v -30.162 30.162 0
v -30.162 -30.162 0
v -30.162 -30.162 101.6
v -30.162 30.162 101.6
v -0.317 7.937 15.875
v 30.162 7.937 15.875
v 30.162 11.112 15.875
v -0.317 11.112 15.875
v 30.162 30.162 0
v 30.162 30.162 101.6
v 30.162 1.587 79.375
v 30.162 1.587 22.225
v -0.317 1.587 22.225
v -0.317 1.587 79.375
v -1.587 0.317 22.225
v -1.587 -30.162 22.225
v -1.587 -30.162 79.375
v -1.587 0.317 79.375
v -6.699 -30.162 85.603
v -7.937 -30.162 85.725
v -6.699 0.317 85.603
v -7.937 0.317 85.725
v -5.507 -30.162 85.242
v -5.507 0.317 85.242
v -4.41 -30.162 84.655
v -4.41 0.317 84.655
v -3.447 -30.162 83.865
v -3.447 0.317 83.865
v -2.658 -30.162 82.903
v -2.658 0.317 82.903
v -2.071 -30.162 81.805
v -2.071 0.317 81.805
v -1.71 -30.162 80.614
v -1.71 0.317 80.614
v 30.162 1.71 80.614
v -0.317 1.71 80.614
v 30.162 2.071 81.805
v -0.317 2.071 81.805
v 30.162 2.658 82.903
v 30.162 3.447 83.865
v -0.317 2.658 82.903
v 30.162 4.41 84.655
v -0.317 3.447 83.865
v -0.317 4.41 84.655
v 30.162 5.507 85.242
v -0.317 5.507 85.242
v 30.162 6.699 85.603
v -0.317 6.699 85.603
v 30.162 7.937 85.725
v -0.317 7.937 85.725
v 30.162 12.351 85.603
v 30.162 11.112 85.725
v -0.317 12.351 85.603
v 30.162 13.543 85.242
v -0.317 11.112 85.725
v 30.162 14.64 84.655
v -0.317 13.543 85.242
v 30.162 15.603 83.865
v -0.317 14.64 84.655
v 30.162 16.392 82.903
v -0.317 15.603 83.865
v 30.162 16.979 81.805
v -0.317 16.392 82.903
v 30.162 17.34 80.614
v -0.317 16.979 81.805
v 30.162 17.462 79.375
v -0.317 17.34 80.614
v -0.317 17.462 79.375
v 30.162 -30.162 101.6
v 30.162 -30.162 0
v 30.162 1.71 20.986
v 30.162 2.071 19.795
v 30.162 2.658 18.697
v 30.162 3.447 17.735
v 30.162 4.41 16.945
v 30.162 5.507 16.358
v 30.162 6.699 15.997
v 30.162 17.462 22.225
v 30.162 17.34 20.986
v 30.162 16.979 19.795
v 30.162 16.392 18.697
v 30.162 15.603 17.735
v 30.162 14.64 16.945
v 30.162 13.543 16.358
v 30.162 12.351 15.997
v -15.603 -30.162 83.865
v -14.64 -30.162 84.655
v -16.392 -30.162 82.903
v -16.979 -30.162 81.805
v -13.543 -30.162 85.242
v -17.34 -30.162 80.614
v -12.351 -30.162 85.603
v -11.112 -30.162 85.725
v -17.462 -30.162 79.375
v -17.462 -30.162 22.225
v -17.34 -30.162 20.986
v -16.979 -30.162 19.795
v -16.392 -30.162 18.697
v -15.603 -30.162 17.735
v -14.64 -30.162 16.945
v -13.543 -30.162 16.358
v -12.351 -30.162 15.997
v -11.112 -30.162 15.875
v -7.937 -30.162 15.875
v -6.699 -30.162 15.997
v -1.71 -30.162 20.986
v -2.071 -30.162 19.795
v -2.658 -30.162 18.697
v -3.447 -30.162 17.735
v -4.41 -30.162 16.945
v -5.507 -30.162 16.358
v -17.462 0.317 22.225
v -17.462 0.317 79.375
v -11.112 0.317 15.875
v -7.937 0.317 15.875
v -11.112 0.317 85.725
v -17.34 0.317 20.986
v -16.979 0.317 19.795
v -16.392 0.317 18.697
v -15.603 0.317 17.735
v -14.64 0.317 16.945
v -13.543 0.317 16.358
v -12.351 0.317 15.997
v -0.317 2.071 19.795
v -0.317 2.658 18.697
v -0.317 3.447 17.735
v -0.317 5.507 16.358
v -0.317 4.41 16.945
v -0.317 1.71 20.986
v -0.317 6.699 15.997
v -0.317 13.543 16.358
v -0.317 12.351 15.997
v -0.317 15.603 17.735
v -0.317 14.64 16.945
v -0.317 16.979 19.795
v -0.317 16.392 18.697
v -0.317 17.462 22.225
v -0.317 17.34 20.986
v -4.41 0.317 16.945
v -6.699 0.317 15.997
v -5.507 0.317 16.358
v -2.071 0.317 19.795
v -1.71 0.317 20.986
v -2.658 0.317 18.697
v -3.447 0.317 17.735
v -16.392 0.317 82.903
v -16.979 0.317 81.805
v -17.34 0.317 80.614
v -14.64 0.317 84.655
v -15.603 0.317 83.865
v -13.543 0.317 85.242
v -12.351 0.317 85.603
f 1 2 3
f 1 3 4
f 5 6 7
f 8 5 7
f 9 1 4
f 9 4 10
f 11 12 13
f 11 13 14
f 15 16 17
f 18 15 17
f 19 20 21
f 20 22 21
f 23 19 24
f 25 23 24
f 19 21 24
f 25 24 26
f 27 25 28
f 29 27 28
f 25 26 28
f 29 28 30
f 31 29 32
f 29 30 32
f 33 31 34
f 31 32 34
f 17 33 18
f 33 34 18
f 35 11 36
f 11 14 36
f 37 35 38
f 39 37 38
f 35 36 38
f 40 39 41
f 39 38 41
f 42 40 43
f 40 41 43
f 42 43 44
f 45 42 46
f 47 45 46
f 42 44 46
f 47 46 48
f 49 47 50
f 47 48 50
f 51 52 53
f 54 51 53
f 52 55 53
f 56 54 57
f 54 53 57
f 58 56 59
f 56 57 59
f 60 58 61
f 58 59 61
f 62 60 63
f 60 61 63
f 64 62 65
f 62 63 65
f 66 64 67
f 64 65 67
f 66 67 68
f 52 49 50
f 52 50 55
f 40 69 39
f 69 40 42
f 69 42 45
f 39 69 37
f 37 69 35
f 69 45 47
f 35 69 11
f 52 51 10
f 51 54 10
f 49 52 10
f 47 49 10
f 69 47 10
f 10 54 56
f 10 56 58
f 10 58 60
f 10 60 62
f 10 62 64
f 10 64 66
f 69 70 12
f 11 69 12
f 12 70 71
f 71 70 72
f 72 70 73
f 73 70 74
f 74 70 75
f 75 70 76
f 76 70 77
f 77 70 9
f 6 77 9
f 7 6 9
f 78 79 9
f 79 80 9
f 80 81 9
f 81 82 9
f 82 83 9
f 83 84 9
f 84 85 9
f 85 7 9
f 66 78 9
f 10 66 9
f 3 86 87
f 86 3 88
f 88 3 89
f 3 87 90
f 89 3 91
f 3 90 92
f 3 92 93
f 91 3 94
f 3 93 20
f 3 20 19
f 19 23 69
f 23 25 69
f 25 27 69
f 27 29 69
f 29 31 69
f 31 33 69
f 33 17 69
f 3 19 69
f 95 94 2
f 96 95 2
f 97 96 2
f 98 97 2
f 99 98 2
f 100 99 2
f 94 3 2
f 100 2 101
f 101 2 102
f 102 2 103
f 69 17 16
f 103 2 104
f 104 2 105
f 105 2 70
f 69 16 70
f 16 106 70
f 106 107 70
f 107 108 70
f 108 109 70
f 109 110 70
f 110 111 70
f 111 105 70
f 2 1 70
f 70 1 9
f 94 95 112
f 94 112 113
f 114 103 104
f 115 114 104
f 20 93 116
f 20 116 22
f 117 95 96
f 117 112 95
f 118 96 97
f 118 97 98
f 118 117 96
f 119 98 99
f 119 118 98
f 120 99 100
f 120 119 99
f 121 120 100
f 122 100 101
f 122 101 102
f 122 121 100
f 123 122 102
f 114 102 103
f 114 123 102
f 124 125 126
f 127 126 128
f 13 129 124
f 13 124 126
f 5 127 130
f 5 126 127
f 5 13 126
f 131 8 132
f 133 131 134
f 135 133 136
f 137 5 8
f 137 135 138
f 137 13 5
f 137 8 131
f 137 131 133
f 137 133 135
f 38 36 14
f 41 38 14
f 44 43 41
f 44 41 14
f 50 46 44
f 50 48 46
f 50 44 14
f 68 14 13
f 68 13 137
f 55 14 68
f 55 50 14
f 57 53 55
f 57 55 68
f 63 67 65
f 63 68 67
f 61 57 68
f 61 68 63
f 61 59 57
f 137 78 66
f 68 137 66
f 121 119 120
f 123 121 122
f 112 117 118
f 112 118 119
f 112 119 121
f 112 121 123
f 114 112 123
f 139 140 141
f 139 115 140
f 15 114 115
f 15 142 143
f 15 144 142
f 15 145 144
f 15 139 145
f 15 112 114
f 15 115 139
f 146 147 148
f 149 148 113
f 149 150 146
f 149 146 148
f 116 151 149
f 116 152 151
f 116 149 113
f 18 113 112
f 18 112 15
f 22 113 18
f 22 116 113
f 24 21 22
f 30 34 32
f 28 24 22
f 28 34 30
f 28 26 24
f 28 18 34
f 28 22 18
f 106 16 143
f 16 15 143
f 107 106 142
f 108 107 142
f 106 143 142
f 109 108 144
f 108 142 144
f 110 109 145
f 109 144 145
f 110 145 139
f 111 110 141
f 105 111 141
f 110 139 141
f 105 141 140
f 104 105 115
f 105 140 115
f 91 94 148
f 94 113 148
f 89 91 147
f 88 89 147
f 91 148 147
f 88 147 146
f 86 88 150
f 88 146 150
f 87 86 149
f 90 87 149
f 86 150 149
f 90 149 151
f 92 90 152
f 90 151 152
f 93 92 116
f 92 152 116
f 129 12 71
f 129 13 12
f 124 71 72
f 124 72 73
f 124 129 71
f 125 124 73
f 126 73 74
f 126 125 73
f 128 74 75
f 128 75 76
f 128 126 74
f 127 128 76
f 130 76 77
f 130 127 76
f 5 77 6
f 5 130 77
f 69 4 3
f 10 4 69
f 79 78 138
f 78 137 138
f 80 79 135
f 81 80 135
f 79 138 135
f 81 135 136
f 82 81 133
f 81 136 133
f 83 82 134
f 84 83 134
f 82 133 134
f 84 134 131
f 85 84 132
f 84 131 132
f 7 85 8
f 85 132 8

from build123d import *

# Parameters (mm, degrees)
F0_W     = 60.325
F0_H     = 60.325
F1_DEPTH = 101.6
F3_W     = 15.875
F3_H     = 69.85
F4_DEPTH = 30.48
F5_W     = 15.875
F5_H     = 69.85
F6_DEPTH = 30.48
F7_R     = 6.35


with BuildPart() as f1:
    # F0 (on Top) → F1 (new body)
    with BuildSketch(Plane.XY):
        Rectangle(F0_W, F0_H)
    extrude(amount=F1_DEPTH)

    # F3 (on face) → F4 (cut)
    with BuildSketch(Plane.XZ.offset(30.1625)):
        with Locations((-9.525, 50.8)):
            Rectangle(F3_W, F3_H)
    extrude(amount=-F4_DEPTH, mode=Mode.SUBTRACT)

    # F5 (on face) → F6 (cut)
    with BuildSketch(Plane.YZ.offset(30.1625)):
        with Locations((9.525, 50.8)):
            Rectangle(F5_W, F5_H)
    extrude(amount=-F6_DEPTH, mode=Mode.SUBTRACT)

    # F7
    f7_edges = [f1.edges().sort_by_distance(p)[0] for p in [
        (-17.4625, -14.9225, 85.725),
        (-1.5875, -14.9225, 85.725),
        (-17.4625, -14.9225, 15.875),
        (-1.5875, -14.9225, 15.875),
        (14.9225, 17.4625, 85.725),
        (14.9225, 1.5875, 85.725),
        (14.9225, 1.5875, 15.875),
        (14.9225, 17.4625, 15.875),
    ]]
    fillet(f7_edges, radius=F7_R)


solid = f1.part
